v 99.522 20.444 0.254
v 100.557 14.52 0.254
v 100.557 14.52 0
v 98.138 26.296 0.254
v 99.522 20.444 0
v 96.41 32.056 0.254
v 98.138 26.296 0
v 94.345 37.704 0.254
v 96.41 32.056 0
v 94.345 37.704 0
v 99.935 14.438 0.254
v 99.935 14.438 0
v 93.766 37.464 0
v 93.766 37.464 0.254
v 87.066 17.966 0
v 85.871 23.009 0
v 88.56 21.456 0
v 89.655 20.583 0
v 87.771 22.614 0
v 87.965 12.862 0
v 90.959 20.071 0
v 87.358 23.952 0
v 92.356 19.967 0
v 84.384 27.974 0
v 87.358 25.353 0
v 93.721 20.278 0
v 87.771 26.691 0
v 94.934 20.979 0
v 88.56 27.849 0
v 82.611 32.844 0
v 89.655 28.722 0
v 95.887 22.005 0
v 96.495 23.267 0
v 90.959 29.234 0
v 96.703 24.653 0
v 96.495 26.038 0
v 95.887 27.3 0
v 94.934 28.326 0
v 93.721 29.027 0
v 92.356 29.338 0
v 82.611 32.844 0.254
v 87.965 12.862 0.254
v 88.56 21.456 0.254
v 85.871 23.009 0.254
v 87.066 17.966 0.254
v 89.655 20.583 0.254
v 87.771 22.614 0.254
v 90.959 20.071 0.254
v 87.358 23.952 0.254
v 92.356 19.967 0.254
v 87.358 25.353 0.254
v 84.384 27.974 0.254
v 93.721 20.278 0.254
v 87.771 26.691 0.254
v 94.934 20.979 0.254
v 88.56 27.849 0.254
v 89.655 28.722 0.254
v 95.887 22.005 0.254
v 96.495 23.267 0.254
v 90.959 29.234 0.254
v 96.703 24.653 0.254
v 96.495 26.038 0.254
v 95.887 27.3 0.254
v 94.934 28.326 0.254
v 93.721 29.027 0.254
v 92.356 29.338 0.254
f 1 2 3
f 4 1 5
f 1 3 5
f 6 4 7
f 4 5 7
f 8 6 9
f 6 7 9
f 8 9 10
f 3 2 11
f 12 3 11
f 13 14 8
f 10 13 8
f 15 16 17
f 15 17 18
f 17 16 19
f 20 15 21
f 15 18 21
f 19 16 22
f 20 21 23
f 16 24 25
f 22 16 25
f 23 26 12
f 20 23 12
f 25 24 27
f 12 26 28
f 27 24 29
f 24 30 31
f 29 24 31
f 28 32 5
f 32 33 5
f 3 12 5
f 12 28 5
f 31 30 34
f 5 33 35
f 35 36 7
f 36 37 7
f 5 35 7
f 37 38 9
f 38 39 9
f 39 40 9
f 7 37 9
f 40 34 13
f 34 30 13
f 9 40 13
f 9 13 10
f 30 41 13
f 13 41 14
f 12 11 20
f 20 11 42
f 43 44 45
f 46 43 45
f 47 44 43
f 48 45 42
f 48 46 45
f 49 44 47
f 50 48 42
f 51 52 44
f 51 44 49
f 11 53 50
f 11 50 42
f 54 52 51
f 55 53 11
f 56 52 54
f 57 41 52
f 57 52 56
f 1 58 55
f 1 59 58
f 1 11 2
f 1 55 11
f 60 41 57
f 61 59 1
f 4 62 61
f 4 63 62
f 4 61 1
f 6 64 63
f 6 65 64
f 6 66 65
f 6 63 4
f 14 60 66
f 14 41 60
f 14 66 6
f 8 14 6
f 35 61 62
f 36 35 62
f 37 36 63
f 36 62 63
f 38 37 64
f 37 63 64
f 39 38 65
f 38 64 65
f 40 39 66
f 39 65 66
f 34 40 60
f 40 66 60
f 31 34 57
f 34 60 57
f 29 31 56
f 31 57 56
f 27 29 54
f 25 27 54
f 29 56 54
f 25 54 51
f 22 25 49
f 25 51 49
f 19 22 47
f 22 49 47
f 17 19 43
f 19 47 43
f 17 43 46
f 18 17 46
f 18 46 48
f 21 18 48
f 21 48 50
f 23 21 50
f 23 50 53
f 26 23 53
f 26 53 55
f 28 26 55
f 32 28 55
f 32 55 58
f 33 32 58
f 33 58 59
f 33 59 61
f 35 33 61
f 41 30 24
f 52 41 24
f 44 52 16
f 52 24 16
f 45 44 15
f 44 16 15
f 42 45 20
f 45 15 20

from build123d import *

# Parameters (mm, degrees)
BOSS_EXTRUDE1_DEPTH = 0.254
SKETCH2_R           = 4.699
CUT_EXTRUDE1_DEPTH  = 1.254
SKETCH3_W           = 2.54
SKETCH3_H           = 0.635
CUT_EXTRUDE2_DEPTH  = 1.254
SKETCH5_OUTSIDE_W   = 121.447
SKETCH5_OUTSIDE_H   = 109.618
CUT_EXTRUDE5_DEPTH  = 1.254


with BuildPart() as part:
    # Sketch1 → Boss-Extrude1 (new body)
    with BuildSketch(Plane.XY):
        with BuildLine():
            Line((67.21146711, 76.191723231), (8.696654013, 17.676910134))
            Line((8.696654013, 17.676910134), (7.228954972, 14.133571205))
            ThreePointArc((7.228954972, 14.133571205), (14.666587579, 6.075099489), (15.105587123, -4.88230096))
            Line((15.105587123, -4.88230096), (18.648926052, -6.35))
            Line((18.648926052, -6.35), (101.401368334, -6.35))
            ThreePointArc((101.401368334, -6.35), (93.866160503, 38.880636728), (67.21146711, 76.191723231))
        make_face()
        with BuildLine():
            Line((88.672924278, 6.35), (27.86051193, 6.35))
            ThreePointArc((27.86051193, 6.35), (26.399857642, 10.93517908), (24.190484974, 15.210228852))
            Line((24.190484974, 15.210228852), (67.191354125, 58.211098004))
            ThreePointArc((67.191354125, 58.211098004), (82.13289044, 34.020557137), (88.672924278, 6.35))
        make_face(mode=Mode.SUBTRACT)
    extrude(amount=BOSS_EXTRUDE1_DEPTH)

    # Sketch2 → Cut-Extrude1 (cut, through all)
    with BuildSketch(Plane.XY.offset(0.254)):
        with Locations((22.225, 0)):
            Circle(SKETCH2_R)
        with Locations((36.195, 0)):
            Circle(SKETCH2_R)
        with Locations((61.722, 0)):
            Circle(SKETCH2_R)
        with Locations((75.692, 0)):
            Circle(SKETCH2_R)
        with Locations((95.25, 0)):
            Circle(SKETCH2_R)
        with Locations((15.715448212, 15.715448212)):
            Circle(SKETCH2_R)
        with Locations((25.593729945, 25.593729945)):
            Circle(SKETCH2_R)
        with Locations((43.644044748, 43.644044748)):
            Circle(SKETCH2_R)
        with Locations((53.522326482, 53.522326482)):
            Circle(SKETCH2_R)
        with Locations((92.004434954, 24.652514046)):
            Circle(SKETCH2_R)
        with Locations((82.48891971, 47.625)):
            Circle(SKETCH2_R)
        with Locations((67.351920908, 67.351920908)):
            Circle(SKETCH2_R)
    extrude(amount=-CUT_EXTRUDE1_DEPTH, mode=Mode.SUBTRACT)

    # Sketch3 → Cut-Extrude2 (cut, through all)
    with BuildSketch(Plane.XY.offset(0.254)):
        Polygon((15.266435406, 24.246691527), (17.06248663, 26.042742751), (17.511499436, 25.593729945), (15.715448212, 23.797678721), align=None)
        Polygon((44.991083167, 53.971339288), (43.195031942, 52.175288063), (43.644044748, 51.726275257), (45.440095973, 53.522326482), align=None)
        with Locations((29.21, -6.0325)):
            Rectangle(SKETCH3_W, SKETCH3_H)
        with Locations((68.707, -6.0325)):
            Rectangle(SKETCH3_W, SKETCH3_H)
        Polygon((29.230733674, 38.210989795), (31.026784898, 40.007041019), (31.475797704, 39.558028213), (29.67974648, 37.761976989), align=None)
        Polygon((56.845021246, 65.825277367), (55.048970022, 64.029226143), (55.497982828, 63.580213337), (57.294034052, 65.376264561), align=None)
        with Locations((48.9585, -6.0325)):
            Rectangle(SKETCH3_W, SKETCH3_H)
        with Locations((85.471, -6.0325)):
            Rectangle(SKETCH3_W, SKETCH3_H)
        Polygon((99.935462164, 14.437711971), (100.266998693, 11.919442024), (101.526133667, 12.085210288), (101.194597138, 14.603480236), align=None)
        Polygon((93.765504959, 37.464305742), (94.938831965, 37.950313702), (93.966816047, 40.296967714), (92.793489041, 39.810959755), align=None)
        Polygon((79.327792988, 62.471156422), (80.874047017, 60.456038938), (81.88160576, 61.229165953), (80.33535173, 63.244283437), align=None)
        Polygon((13.593916116, 7.005422516), (14.565932035, 4.658768503), (15.739259041, 5.144776462), (14.767243123, 7.491430475), align=None)
    extrude(amount=-CUT_EXTRUDE2_DEPTH, mode=Mode.SUBTRACT)

    # Sketch5 outside → Cut-Extrude5 (cut, through all)
    with BuildSketch(Plane.XY.offset(0.254)):
        with Locations((54.4145, 34.921)):
            Rectangle(SKETCH5_OUTSIDE_W, SKETCH5_OUTSIDE_H)
        with BuildLine():
            Line((81.437068577, 32.35770019), (95.518252433, 38.190317518))
            ThreePointArc((95.518252433, 38.190317518), (99.36478975, 26.62471517), (101.816391891, 14.685341068))
            Line((101.816391891, 14.685341068), (86.705420292, 12.695943916))
            ThreePointArc((86.705420292, 12.695943916), (84.644080158, 22.680312922), (81.437068577, 32.35770019))
        make_face(mode=Mode.SUBTRACT)
    extrude(amount=-CUT_EXTRUDE5_DEPTH, mode=Mode.SUBTRACT)


solid = part.part
